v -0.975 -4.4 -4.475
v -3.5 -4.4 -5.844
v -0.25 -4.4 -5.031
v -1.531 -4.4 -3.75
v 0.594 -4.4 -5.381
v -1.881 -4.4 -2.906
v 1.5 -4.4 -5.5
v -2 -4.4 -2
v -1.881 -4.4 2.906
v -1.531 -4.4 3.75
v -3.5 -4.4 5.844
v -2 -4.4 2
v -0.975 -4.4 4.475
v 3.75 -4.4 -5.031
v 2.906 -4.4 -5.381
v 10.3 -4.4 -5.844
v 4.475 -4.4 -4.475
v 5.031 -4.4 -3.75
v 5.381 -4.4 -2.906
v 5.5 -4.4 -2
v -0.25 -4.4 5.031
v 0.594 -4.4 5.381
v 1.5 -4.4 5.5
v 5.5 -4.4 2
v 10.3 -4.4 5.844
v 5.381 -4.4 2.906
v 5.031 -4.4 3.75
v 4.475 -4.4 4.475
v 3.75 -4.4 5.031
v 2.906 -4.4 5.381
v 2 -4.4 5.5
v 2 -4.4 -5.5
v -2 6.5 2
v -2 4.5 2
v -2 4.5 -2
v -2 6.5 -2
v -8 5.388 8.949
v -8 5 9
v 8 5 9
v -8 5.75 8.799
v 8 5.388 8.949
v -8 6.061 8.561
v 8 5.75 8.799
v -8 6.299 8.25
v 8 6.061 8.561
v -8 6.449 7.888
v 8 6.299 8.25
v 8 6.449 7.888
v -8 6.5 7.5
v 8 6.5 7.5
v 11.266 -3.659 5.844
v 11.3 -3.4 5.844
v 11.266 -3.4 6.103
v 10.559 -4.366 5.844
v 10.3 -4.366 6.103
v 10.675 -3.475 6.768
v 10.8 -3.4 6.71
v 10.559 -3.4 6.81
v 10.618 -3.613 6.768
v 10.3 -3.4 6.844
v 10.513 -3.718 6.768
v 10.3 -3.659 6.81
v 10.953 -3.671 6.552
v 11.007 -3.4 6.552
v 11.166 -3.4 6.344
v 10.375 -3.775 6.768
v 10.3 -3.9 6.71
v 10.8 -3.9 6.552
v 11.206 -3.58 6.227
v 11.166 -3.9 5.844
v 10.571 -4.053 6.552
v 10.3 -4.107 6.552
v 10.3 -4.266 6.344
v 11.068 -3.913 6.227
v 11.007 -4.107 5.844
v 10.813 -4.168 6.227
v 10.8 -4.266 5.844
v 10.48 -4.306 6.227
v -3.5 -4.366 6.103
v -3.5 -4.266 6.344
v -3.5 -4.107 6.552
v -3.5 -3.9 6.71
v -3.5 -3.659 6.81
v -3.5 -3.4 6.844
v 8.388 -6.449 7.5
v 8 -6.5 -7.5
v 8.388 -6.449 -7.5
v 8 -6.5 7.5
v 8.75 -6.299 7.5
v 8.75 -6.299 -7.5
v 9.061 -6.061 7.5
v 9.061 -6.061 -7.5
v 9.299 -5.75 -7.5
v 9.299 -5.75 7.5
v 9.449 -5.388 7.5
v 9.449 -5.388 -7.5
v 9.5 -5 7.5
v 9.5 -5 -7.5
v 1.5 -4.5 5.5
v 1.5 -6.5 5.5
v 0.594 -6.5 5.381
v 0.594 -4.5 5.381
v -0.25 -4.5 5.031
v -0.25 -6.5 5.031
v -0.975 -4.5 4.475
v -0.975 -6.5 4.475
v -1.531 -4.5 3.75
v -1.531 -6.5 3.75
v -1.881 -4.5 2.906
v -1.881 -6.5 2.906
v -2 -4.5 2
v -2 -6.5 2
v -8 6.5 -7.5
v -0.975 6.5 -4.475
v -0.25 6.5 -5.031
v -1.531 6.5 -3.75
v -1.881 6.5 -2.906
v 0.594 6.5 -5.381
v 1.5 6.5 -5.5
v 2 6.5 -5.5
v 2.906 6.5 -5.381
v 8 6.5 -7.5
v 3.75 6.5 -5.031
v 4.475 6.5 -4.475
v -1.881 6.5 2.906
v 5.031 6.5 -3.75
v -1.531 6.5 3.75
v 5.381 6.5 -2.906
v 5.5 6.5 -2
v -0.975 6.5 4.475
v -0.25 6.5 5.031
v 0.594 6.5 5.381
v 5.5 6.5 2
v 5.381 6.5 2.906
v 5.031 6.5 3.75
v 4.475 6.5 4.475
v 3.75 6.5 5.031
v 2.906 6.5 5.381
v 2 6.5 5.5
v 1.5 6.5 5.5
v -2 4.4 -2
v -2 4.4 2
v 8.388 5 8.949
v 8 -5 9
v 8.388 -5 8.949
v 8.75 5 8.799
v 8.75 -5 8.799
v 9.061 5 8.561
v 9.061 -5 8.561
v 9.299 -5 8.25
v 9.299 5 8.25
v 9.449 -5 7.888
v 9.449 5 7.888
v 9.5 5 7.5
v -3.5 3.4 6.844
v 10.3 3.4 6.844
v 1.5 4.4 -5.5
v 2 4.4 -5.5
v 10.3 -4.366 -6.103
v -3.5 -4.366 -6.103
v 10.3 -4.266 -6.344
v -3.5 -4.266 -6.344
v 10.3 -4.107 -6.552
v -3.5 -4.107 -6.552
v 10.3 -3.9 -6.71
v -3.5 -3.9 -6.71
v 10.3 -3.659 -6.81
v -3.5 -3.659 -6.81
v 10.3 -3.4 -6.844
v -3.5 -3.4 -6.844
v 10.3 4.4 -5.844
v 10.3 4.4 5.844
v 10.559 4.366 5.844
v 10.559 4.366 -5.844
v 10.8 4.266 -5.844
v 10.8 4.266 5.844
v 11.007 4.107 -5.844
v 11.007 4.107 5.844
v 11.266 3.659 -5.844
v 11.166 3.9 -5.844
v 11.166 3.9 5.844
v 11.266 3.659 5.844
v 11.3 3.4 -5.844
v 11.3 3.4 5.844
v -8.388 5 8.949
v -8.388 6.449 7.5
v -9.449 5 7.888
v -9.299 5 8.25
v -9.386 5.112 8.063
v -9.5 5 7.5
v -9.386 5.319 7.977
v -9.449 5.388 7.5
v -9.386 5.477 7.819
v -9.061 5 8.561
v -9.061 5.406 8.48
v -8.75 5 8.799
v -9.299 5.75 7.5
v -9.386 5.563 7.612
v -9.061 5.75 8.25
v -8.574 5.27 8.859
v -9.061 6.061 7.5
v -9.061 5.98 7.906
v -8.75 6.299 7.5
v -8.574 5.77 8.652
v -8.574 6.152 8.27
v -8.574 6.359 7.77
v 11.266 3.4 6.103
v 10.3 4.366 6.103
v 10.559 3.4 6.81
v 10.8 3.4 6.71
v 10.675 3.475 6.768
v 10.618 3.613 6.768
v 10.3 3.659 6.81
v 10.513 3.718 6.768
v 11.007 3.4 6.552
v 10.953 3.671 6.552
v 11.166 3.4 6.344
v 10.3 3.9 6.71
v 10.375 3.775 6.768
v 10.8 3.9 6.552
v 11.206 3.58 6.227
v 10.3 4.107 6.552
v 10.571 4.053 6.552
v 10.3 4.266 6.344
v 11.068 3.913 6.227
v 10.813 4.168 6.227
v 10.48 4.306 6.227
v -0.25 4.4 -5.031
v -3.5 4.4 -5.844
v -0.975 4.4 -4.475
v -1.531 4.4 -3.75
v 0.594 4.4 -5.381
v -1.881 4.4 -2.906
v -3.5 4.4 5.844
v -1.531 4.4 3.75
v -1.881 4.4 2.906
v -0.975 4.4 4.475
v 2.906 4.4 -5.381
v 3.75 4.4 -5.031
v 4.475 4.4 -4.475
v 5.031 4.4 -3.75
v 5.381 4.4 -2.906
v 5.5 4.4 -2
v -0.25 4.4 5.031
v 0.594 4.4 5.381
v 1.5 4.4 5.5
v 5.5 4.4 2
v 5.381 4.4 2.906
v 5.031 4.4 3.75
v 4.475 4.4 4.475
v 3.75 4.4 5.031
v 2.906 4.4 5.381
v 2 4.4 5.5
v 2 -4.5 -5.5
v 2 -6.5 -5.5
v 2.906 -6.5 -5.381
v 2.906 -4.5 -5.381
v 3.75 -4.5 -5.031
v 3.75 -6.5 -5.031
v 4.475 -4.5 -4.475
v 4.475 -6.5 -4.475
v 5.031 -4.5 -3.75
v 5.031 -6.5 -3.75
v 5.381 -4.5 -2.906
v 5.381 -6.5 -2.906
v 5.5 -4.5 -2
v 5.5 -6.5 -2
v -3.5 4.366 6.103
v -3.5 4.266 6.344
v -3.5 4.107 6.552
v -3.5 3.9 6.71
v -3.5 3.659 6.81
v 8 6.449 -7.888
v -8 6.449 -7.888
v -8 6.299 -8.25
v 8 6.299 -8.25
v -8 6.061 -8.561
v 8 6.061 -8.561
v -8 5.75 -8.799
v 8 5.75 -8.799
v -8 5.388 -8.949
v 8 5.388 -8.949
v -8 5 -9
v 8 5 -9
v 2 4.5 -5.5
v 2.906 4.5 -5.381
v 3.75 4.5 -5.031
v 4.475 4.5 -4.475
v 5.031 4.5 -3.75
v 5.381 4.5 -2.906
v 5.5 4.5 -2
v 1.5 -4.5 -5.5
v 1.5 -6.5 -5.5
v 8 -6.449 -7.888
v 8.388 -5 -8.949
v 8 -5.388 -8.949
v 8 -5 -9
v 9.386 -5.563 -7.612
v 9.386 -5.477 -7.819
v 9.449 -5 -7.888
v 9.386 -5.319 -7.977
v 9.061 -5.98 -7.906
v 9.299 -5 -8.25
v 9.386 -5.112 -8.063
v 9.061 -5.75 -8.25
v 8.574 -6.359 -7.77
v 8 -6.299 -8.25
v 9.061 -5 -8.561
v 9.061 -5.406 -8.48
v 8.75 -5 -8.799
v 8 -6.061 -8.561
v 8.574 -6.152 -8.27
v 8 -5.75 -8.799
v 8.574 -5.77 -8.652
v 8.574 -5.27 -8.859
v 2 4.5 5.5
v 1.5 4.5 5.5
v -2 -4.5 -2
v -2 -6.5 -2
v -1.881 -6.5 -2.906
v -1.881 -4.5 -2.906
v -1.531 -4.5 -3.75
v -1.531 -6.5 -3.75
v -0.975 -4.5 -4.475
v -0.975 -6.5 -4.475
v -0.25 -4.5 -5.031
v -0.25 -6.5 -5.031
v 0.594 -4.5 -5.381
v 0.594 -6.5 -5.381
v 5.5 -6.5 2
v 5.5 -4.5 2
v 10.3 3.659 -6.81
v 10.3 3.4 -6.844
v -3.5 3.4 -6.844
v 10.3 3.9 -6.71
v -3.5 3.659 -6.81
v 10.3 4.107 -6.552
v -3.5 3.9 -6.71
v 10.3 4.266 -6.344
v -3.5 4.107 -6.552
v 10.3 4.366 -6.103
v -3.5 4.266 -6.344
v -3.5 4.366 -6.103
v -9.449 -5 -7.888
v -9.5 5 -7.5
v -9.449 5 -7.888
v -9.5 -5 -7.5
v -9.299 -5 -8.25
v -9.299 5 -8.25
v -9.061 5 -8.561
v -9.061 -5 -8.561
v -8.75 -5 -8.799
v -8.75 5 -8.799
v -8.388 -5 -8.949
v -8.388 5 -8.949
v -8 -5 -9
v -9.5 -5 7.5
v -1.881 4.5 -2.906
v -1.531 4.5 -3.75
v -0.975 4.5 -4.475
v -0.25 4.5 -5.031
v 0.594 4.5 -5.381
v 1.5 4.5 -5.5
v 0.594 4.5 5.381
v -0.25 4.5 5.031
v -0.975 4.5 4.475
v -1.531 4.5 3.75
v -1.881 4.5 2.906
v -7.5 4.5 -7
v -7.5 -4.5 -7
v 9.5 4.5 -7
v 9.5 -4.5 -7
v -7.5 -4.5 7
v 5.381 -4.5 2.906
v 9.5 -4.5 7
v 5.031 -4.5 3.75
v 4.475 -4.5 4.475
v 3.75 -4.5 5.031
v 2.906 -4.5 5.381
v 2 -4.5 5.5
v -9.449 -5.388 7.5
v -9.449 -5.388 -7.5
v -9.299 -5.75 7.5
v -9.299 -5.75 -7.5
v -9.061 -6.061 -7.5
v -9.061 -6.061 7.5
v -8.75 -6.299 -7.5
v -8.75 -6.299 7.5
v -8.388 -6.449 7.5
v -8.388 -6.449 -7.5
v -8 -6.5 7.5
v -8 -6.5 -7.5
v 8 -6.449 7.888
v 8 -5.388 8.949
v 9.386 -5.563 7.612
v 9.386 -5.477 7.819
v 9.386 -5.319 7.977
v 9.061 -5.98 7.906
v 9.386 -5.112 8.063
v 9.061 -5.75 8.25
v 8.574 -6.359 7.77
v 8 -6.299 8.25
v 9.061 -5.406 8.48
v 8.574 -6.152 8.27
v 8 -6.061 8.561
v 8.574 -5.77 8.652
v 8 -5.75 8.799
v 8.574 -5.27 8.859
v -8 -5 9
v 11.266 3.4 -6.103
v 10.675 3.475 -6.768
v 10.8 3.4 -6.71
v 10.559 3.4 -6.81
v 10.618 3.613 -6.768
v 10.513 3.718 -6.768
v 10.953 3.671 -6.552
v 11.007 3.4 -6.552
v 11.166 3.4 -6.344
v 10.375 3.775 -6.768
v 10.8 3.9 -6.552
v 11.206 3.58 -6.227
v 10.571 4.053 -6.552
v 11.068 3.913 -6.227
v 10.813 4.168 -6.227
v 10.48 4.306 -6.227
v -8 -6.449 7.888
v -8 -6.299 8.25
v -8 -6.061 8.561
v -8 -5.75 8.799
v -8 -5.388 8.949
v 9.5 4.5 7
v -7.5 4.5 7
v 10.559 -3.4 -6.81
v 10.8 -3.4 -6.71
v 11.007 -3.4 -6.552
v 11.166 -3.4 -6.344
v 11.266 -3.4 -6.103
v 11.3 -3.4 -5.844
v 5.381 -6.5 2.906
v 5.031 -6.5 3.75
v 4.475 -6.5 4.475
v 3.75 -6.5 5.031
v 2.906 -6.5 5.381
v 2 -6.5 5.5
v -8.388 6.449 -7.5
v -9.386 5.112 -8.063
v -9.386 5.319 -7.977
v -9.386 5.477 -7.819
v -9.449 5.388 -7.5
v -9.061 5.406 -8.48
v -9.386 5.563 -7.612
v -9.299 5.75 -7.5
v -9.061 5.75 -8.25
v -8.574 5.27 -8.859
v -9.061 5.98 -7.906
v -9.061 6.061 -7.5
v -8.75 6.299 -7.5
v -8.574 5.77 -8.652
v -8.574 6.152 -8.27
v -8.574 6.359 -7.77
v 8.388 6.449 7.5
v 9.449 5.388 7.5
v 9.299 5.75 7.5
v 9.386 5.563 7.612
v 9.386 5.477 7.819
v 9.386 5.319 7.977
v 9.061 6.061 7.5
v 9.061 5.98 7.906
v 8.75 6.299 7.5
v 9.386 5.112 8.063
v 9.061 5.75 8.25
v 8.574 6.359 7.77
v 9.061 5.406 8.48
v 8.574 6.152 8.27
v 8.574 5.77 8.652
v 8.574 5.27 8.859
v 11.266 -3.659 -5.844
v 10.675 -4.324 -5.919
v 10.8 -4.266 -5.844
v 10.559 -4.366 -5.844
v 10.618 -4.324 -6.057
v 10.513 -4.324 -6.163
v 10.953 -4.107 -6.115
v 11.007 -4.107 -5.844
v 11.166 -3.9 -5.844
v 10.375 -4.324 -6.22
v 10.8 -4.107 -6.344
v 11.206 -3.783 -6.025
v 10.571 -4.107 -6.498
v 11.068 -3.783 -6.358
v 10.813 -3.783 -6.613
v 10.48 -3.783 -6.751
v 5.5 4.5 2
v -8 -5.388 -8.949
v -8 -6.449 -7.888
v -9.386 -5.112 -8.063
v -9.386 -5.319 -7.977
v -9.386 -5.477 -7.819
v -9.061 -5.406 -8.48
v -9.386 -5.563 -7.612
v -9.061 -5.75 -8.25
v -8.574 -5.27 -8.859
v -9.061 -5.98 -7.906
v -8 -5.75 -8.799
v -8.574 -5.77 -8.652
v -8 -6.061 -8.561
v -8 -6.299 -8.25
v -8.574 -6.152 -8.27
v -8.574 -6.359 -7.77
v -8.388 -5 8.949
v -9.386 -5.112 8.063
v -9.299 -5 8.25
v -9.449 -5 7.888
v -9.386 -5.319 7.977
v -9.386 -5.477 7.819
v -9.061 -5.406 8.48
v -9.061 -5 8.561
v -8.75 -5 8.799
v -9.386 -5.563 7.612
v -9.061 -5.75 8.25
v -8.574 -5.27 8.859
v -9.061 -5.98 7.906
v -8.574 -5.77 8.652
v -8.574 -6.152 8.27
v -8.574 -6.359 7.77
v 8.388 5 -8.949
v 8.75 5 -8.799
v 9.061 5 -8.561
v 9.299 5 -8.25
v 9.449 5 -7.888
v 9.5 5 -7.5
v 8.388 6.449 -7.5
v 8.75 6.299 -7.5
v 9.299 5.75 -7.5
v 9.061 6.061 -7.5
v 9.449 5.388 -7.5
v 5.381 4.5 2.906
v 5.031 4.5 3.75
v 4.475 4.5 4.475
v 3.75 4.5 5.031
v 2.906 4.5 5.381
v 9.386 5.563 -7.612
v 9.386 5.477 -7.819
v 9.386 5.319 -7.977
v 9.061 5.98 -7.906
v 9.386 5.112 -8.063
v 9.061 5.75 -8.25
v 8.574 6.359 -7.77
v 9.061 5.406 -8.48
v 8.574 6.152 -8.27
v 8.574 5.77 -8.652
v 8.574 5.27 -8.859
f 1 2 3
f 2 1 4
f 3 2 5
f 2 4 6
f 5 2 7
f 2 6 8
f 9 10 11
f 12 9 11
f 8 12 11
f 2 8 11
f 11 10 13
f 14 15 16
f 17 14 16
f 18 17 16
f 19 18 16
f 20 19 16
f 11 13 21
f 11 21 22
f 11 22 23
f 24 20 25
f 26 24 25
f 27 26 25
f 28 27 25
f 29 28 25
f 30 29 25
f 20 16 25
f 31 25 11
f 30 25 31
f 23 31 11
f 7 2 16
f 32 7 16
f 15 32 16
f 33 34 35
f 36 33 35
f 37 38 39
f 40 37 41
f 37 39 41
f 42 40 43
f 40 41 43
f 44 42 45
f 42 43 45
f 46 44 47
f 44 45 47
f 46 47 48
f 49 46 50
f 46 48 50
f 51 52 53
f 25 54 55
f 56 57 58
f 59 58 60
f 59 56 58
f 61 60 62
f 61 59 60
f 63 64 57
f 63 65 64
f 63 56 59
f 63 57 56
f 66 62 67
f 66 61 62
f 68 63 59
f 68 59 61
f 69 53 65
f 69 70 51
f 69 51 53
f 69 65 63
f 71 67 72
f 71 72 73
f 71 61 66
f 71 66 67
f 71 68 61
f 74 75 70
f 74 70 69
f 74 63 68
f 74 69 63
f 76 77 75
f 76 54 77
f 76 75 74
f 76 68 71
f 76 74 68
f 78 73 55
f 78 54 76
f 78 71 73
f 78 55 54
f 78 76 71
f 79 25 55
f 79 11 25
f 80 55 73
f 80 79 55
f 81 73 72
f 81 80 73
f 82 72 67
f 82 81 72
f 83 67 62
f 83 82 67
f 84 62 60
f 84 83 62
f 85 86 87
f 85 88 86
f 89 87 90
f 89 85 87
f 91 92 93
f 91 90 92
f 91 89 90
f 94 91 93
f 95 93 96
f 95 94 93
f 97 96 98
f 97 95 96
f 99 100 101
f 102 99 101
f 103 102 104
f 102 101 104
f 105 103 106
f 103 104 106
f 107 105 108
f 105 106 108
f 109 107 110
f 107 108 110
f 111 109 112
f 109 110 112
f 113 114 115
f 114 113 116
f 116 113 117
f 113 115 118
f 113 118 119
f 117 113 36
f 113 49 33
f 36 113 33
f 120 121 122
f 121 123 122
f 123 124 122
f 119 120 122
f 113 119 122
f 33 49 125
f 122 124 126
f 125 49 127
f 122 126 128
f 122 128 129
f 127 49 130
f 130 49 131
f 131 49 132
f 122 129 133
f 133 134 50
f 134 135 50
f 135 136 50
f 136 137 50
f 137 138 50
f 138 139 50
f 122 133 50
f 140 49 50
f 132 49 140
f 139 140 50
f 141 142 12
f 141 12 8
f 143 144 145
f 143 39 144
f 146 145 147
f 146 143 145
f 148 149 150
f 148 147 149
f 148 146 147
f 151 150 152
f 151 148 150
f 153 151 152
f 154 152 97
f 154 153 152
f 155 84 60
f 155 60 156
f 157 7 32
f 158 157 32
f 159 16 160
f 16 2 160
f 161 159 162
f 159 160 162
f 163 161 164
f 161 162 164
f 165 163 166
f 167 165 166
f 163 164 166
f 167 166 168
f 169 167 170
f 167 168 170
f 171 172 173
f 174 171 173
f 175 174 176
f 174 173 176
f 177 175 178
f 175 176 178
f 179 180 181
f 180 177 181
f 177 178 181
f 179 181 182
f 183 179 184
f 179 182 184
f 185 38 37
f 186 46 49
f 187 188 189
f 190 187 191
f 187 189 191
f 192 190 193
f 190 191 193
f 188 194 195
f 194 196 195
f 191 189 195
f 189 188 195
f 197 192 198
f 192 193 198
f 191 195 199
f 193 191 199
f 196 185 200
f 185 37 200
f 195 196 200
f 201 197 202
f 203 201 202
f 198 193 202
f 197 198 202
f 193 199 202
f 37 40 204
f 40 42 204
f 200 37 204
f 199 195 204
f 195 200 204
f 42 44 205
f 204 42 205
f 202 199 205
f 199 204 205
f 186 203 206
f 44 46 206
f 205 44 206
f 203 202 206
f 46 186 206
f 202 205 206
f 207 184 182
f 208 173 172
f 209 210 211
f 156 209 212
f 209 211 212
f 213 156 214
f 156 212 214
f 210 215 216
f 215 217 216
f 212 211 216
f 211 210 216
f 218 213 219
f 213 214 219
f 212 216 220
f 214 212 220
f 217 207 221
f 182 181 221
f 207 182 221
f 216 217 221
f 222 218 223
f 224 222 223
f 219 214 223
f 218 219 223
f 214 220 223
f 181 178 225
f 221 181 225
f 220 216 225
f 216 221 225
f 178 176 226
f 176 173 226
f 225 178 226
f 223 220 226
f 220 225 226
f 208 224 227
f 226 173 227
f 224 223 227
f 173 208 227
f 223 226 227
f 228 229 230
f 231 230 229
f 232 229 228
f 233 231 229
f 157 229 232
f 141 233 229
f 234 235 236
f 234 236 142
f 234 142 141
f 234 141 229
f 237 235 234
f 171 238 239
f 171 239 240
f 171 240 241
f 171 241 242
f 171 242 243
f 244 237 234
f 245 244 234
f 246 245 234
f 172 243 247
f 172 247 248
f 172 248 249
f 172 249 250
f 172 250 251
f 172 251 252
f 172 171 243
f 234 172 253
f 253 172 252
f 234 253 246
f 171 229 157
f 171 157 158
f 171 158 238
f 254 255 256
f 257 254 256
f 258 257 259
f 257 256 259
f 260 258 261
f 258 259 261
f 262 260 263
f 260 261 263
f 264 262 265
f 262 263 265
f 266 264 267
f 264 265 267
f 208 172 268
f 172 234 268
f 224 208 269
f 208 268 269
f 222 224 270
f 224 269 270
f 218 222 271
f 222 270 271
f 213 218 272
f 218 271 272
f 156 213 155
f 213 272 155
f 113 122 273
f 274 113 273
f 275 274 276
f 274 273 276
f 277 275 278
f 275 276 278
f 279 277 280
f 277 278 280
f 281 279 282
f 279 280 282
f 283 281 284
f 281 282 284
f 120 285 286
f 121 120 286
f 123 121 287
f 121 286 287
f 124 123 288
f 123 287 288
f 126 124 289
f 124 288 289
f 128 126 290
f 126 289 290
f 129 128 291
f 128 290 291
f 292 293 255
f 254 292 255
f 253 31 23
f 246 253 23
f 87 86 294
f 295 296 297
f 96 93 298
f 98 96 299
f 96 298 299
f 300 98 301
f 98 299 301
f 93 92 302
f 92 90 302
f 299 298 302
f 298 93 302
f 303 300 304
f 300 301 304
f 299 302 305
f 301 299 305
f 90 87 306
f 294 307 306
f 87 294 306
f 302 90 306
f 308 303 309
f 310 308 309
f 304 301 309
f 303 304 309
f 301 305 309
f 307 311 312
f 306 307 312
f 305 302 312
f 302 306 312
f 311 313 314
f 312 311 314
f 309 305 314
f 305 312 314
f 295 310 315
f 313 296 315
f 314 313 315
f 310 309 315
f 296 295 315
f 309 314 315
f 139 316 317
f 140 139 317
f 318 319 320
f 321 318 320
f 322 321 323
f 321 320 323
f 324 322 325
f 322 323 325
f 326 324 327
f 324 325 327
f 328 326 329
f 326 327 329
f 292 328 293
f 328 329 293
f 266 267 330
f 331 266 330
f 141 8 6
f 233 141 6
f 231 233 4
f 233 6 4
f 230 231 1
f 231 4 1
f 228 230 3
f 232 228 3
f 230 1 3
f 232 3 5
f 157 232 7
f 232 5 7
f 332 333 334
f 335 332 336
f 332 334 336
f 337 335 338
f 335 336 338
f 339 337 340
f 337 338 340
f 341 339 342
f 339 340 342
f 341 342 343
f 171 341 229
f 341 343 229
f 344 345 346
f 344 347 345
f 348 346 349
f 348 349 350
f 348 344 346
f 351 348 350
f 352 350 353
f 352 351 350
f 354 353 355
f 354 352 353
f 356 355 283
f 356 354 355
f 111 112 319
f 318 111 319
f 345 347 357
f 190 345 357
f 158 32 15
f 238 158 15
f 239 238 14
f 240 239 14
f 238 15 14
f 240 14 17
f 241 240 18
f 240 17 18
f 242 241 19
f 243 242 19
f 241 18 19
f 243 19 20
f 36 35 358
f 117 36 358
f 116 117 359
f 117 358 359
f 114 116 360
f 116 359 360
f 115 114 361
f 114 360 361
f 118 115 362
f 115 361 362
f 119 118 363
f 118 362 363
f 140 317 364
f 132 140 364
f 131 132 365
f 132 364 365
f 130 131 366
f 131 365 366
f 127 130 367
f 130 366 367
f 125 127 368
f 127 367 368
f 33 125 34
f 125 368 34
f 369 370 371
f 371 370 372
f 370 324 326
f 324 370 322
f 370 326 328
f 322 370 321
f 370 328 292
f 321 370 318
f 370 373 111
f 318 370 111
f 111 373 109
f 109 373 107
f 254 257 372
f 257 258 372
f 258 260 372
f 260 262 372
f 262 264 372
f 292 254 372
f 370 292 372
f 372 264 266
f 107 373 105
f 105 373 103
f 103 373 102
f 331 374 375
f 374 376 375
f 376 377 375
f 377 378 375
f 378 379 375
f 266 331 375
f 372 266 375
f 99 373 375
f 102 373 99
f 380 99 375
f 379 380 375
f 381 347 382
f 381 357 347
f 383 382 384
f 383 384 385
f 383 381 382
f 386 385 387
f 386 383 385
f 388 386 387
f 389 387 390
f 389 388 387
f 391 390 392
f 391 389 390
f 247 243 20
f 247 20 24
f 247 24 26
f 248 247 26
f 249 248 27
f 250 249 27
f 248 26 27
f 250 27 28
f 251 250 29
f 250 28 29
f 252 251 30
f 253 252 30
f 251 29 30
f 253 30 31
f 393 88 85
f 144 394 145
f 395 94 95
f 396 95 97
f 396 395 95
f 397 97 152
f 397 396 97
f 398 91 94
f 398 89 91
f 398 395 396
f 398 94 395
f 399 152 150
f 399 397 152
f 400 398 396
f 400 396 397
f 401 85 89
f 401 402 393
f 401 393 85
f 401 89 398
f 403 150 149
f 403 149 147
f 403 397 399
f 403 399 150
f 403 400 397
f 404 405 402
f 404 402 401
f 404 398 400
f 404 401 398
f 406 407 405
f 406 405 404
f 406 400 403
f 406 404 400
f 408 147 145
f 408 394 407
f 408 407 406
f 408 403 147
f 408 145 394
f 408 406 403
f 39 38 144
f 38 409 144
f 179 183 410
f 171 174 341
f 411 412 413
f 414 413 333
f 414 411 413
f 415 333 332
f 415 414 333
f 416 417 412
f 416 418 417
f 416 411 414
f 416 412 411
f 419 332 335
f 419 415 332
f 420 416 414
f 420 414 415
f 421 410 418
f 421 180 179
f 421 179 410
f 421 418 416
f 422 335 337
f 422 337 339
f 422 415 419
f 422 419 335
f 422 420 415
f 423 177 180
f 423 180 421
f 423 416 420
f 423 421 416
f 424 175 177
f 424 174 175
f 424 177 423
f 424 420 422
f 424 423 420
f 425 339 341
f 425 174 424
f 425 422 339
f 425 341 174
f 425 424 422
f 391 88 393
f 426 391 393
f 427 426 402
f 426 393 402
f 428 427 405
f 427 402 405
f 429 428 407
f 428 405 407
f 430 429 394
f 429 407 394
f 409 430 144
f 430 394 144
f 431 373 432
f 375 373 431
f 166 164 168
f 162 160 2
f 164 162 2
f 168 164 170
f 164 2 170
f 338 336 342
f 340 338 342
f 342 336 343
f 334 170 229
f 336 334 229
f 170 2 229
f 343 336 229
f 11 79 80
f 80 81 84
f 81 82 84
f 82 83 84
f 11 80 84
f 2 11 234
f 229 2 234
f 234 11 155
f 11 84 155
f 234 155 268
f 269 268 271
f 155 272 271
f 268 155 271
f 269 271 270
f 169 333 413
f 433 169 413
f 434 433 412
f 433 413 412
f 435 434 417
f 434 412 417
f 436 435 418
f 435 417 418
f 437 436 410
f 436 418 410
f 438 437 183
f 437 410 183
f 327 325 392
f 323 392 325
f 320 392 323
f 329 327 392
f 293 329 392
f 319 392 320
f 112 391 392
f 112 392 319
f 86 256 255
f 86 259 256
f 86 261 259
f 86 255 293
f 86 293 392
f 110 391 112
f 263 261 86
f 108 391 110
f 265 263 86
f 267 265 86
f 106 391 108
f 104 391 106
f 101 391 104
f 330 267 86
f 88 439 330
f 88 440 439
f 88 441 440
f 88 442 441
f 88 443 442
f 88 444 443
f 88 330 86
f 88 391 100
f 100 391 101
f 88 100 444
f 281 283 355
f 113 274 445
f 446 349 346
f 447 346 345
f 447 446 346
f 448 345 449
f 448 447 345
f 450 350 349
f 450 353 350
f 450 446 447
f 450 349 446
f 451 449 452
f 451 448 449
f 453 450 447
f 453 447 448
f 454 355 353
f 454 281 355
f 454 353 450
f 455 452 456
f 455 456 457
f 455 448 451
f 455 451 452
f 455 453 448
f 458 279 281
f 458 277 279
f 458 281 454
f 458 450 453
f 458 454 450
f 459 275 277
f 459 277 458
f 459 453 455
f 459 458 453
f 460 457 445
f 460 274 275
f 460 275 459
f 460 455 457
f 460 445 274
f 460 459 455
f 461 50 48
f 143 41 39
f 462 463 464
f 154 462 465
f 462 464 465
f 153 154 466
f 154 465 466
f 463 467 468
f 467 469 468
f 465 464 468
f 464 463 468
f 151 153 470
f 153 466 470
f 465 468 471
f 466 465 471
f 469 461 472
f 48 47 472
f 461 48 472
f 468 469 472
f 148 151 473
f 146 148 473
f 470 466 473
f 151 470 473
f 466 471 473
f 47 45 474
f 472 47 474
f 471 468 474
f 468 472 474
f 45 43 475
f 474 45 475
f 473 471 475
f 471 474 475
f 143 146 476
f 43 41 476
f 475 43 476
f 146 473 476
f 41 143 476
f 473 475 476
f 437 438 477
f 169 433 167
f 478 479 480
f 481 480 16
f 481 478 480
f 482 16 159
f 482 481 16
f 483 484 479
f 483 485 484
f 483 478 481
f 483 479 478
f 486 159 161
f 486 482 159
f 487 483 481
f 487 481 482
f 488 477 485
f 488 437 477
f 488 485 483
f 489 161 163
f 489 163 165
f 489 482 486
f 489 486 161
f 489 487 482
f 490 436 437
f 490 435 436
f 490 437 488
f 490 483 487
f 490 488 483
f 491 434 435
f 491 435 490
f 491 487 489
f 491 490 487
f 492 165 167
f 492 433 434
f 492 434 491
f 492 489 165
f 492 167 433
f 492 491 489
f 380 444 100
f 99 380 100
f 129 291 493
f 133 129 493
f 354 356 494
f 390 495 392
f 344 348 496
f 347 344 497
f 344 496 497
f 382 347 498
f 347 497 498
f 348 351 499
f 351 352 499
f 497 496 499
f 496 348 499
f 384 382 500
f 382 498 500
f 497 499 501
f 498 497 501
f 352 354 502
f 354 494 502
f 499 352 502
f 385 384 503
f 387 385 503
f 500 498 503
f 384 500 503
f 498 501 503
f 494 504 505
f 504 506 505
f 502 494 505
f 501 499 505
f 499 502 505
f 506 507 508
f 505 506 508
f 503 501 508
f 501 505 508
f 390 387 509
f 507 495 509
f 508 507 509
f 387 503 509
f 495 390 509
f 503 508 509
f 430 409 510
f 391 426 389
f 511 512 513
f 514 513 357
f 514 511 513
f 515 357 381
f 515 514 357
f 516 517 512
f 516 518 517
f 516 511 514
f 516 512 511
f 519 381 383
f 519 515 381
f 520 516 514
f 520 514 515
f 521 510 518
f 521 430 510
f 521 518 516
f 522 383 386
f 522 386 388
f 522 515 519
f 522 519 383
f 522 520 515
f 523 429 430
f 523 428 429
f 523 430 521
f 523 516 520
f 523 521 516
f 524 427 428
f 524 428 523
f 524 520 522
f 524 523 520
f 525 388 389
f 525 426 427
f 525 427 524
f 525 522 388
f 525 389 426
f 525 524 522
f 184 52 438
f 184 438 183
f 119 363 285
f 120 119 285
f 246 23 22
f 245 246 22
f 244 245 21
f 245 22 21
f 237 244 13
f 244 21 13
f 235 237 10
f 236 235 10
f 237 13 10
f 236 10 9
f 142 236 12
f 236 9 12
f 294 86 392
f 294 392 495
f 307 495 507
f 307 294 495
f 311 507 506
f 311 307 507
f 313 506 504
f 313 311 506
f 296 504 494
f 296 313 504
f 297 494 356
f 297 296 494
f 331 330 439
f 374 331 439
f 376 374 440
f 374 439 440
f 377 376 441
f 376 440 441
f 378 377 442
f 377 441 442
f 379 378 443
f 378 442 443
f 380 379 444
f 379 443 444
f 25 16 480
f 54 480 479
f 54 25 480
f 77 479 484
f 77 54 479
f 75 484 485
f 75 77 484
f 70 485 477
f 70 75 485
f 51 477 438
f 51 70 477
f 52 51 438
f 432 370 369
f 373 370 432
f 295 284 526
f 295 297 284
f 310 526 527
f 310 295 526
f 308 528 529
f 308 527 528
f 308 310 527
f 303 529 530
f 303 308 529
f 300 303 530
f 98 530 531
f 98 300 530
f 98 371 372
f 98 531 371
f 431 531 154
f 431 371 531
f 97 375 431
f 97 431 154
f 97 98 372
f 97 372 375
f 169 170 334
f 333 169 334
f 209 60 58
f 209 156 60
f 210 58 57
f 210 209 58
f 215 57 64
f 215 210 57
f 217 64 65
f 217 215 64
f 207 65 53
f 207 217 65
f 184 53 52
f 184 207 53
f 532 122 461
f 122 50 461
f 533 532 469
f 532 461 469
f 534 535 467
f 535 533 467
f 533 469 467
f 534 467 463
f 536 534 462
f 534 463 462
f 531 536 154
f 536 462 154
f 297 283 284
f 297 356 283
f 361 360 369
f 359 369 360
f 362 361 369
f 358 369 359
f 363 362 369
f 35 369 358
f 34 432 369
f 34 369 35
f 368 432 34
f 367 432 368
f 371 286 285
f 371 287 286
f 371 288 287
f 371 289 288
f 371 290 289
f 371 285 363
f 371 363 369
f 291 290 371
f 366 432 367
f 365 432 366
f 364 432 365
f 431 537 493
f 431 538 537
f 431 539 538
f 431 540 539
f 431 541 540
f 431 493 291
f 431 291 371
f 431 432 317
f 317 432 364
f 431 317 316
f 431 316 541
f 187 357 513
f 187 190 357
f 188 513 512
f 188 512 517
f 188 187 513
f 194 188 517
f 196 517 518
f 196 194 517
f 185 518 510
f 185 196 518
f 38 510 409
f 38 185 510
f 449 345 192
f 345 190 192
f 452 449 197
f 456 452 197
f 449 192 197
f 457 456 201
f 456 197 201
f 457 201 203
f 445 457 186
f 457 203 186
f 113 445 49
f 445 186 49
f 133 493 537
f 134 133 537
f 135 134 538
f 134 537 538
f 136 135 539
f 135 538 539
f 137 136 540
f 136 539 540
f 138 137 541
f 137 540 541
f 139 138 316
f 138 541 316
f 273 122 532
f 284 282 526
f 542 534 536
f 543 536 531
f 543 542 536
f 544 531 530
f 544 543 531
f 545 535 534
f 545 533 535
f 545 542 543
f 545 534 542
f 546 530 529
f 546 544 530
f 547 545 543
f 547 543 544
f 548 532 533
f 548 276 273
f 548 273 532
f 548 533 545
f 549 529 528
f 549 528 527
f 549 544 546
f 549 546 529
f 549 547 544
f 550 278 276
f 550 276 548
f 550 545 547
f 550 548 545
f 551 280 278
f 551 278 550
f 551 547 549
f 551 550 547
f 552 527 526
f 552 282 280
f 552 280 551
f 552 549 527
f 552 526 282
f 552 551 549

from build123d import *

# Parameters (mm, degrees)
F0_W     = 19
F0_H     = 18
F1_DEPTH = 6.5
F2_T     = -2
F3_R     = 1.5
F5_W     = 8.8
F5_H     = 13.688888
F6_DEPTH = 14.8
F8_R     = 1
F9_DEPTH = 12.5


with BuildPart() as f1:
    # F0 (on Front) → F1 (new body, symmetric)
    with BuildSketch(Plane.XZ):
        Rectangle(F0_W, F0_H)
    extrude(amount=F1_DEPTH, both=True)

    # F2
    f2_openings = [f1.faces().sort_by_distance(p)[0] for p in [
        (9.5, 0, 0),
    ]]
    offset(amount=F2_T, openings=f2_openings)

    # F3
    f3_edges = [f1.edges().sort_by_distance(p)[0] for p in [
        (0, 6.5, 9),
        (0, 6.5, -9),
        (0, -6.5, 9),
        (0, -6.5, -9),
        (9.5, -6.5, 0),
        (9.5, 6.5, 0),
        (-9.5, 0, 9),
        (9.5, 0, 9),
        (9.5, 0, -9),
        (-9.5, 0, -9),
        (-9.5, 6.5, 0),
        (-9.5, -6.5, 0),
    ]]
    fillet(f3_edges, radius=F3_R)


with BuildPart() as f6:
    # F5 (on offset) → F6 (new body)
    with BuildSketch(Plane.YZ.offset(11.3)):
        Rectangle(F5_W, F5_H)
    extrude(amount=-F6_DEPTH)

    # F8
    f8_edges = [f6.edges().sort_by_distance(p)[0] for p in [
        (11.3, 4.4, 0),
        (11.3, 0, -6.844444),
        (11.3, -4.4, 0),
        (11.3, 0, 6.844444),
        (3.9, 4.4, -6.844444),
        (3.9, 4.4, 6.844444),
        (3.9, -4.4, 6.844444),
        (3.9, -4.4, -6.844444),
    ]]
    fillet(f8_edges, radius=F8_R)


with BuildPart() as f9_tool:
    # F7 (on Front) → F9 (new body, symmetric)
    with BuildSketch(Plane.XZ):
        with BuildLine():
            Line((2, 5.5), (1.5, 5.5))
            ThreePointArc((1.5, 5.5), (-0.974874, 4.474874), (-2, 2))
            Line((-2, 2), (-2, -2))
            ThreePointArc((-2, -2), (-0.974874, -4.474874), (1.5, -5.5))
            Line((1.5, -5.5), (2, -5.5))
            ThreePointArc((2, -5.5), (4.474874, -4.474874), (5.5, -2))
            Line((5.5, -2), (5.5, 2))
            ThreePointArc((5.5, 2), (4.474874, 4.474874), (2, 5.5))
        make_face()
    extrude(amount=F9_DEPTH, both=True)


with BuildPart() as f1_1:
    add(f1.part)

    # F9: cut by f9_tool
    add(f9_tool.part, mode=Mode.SUBTRACT)


with BuildPart() as f6_1:
    add(f6.part)

    # F9: cut by f9_tool
    add(f9_tool.part, mode=Mode.SUBTRACT)


solid = Compound([f1_1.part, f6_1.part])
